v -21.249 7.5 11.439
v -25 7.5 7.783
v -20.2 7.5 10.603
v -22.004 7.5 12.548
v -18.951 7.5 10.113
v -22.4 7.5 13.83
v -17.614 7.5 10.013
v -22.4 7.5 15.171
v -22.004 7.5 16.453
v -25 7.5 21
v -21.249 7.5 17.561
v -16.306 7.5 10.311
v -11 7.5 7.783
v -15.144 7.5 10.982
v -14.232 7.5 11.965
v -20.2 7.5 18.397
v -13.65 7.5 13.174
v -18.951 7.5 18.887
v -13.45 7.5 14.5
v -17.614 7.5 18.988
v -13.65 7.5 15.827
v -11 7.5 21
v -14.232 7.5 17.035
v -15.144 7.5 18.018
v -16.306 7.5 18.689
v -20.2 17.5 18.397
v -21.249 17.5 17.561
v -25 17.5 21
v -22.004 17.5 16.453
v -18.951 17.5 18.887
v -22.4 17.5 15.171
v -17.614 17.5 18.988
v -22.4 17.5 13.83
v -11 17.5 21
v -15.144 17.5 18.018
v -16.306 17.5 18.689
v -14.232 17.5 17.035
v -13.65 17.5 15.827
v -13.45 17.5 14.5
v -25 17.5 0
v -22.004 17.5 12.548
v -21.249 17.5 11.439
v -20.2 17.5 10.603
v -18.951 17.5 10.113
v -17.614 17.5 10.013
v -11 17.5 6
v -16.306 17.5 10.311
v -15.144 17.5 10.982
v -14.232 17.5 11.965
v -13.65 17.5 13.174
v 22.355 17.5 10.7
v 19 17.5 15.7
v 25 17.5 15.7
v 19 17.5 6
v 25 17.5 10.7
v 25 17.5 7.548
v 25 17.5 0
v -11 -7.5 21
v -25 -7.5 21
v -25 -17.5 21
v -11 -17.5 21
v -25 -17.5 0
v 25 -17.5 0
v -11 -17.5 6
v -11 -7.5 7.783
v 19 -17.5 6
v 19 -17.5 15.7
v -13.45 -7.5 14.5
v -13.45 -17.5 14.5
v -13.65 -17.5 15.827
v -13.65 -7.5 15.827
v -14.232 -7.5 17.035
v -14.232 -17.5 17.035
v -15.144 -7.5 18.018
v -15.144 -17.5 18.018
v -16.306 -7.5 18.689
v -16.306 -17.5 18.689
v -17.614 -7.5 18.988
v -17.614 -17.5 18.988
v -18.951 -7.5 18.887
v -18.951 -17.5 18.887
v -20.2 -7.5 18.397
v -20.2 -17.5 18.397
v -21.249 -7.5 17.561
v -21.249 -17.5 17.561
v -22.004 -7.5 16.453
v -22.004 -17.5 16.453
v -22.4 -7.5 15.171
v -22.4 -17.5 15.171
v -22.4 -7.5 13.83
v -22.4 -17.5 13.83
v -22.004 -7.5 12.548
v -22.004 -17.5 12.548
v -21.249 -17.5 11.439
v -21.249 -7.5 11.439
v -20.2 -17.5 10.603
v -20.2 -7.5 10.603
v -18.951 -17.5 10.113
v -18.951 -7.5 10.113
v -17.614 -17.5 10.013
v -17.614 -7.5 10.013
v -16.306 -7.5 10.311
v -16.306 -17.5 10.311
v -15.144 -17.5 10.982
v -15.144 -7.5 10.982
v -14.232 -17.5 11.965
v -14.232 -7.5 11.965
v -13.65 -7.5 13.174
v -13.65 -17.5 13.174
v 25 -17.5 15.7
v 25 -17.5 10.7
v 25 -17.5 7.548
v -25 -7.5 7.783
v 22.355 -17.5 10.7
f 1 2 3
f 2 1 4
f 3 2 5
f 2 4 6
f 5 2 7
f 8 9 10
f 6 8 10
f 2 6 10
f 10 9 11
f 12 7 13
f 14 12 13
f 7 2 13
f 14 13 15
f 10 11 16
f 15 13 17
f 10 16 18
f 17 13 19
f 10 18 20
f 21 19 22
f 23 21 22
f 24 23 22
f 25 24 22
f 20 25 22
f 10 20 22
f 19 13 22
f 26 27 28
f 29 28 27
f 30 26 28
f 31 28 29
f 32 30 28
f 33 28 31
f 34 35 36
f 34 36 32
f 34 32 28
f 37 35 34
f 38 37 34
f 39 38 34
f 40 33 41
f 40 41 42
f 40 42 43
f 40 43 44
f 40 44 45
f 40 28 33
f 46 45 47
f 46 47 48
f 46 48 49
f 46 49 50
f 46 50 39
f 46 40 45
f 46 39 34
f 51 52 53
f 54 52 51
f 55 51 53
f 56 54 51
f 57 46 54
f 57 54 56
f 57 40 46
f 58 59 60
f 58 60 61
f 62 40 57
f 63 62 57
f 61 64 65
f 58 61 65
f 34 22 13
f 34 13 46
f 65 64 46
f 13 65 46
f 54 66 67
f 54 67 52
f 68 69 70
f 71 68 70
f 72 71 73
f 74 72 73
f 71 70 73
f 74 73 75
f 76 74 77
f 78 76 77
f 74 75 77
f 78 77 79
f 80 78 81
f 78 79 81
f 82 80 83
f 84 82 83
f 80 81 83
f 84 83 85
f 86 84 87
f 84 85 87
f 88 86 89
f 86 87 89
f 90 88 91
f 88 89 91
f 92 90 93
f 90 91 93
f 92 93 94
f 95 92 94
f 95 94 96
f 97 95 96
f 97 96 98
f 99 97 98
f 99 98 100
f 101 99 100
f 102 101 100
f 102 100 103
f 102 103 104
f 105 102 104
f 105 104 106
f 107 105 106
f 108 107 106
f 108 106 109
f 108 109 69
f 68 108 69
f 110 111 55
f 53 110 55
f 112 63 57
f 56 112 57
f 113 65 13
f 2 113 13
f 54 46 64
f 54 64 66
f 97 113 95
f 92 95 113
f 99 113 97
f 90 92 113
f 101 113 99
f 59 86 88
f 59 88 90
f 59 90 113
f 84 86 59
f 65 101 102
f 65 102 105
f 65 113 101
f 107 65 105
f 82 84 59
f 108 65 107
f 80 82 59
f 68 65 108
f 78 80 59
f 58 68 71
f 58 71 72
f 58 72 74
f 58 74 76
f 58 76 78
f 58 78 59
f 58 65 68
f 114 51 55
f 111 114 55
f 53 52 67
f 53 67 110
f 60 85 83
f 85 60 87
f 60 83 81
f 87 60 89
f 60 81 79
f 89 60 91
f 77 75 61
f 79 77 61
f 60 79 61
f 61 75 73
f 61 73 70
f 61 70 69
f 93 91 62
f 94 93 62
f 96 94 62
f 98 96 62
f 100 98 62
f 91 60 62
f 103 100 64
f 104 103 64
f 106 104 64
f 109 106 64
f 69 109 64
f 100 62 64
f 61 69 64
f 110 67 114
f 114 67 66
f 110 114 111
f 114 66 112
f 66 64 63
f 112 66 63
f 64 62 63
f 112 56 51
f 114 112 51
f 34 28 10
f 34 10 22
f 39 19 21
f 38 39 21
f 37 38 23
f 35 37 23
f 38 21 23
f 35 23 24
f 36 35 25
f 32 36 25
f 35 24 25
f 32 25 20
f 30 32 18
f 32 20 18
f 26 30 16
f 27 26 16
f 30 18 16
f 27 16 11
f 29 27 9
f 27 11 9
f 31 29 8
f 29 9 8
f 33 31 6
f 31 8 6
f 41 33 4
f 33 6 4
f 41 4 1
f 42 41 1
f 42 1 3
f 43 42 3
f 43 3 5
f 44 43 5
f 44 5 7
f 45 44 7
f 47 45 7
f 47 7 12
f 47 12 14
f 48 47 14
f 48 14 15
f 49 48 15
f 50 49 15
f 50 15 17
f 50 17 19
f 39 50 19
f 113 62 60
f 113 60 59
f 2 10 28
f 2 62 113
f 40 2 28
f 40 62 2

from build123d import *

# Parameters (mm, degrees)
F0_W      = 50
F0_H      = 35
F1_DEPTH  = 6
F2_W      = 14
F2_H      = 35
F3_DEPTH  = 15
F4_W      = 15
F4_H      = 13.216582
F5_DEPTH  = 25
F6_R      = 4.5
F7_DEPTH  = 41.5
F8_W      = 6
F8_H      = 35
F9_DEPTH  = 9.7
F11_DEPTH = 36.8


with BuildPart() as f1:
    # F0 (on Top) → F1 (new body)
    with BuildSketch(Plane.XY):
        Rectangle(F0_W, F0_H)
    extrude(amount=F1_DEPTH)

    # F2 (on face) → F3 (join)
    with BuildSketch(Plane.XY.offset(6)):
        with Locations((-18, 0)):
            Rectangle(F2_W, F2_H)
    extrude(amount=F3_DEPTH)

    # F4 (on face) → F5 (cut)
    with BuildSketch(Plane.YZ.offset(-11)):
        with Locations((0, 14.391709)):
            Rectangle(F4_W, F4_H)
    extrude(amount=-F5_DEPTH, mode=Mode.SUBTRACT)

    # F6 (on face) → F7 (cut)
    with BuildSketch(Plane.XZ.offset(17.5)):
        with Locations((-17.95, 14.500192)):
            Circle(F6_R)
    extrude(amount=-F7_DEPTH, mode=Mode.SUBTRACT)

    # F8 (on face) → F9 (join)
    with BuildSketch(Plane.XY.offset(6)):
        with Locations((22, 0)):
            Rectangle(F8_W, F8_H)
    extrude(amount=F9_DEPTH)

    # F10 (on face) → F11 (cut)
    with BuildSketch(Plane(origin=(0, 17.5, 0), x_dir=(-1, 0, 0), z_dir=(0, 1, 0))):
        Polygon((-22.35515, 10.7), (-25, 10.7), (-25, 7.547991), align=None)
    extrude(amount=-F11_DEPTH, mode=Mode.SUBTRACT)


solid = f1.part
